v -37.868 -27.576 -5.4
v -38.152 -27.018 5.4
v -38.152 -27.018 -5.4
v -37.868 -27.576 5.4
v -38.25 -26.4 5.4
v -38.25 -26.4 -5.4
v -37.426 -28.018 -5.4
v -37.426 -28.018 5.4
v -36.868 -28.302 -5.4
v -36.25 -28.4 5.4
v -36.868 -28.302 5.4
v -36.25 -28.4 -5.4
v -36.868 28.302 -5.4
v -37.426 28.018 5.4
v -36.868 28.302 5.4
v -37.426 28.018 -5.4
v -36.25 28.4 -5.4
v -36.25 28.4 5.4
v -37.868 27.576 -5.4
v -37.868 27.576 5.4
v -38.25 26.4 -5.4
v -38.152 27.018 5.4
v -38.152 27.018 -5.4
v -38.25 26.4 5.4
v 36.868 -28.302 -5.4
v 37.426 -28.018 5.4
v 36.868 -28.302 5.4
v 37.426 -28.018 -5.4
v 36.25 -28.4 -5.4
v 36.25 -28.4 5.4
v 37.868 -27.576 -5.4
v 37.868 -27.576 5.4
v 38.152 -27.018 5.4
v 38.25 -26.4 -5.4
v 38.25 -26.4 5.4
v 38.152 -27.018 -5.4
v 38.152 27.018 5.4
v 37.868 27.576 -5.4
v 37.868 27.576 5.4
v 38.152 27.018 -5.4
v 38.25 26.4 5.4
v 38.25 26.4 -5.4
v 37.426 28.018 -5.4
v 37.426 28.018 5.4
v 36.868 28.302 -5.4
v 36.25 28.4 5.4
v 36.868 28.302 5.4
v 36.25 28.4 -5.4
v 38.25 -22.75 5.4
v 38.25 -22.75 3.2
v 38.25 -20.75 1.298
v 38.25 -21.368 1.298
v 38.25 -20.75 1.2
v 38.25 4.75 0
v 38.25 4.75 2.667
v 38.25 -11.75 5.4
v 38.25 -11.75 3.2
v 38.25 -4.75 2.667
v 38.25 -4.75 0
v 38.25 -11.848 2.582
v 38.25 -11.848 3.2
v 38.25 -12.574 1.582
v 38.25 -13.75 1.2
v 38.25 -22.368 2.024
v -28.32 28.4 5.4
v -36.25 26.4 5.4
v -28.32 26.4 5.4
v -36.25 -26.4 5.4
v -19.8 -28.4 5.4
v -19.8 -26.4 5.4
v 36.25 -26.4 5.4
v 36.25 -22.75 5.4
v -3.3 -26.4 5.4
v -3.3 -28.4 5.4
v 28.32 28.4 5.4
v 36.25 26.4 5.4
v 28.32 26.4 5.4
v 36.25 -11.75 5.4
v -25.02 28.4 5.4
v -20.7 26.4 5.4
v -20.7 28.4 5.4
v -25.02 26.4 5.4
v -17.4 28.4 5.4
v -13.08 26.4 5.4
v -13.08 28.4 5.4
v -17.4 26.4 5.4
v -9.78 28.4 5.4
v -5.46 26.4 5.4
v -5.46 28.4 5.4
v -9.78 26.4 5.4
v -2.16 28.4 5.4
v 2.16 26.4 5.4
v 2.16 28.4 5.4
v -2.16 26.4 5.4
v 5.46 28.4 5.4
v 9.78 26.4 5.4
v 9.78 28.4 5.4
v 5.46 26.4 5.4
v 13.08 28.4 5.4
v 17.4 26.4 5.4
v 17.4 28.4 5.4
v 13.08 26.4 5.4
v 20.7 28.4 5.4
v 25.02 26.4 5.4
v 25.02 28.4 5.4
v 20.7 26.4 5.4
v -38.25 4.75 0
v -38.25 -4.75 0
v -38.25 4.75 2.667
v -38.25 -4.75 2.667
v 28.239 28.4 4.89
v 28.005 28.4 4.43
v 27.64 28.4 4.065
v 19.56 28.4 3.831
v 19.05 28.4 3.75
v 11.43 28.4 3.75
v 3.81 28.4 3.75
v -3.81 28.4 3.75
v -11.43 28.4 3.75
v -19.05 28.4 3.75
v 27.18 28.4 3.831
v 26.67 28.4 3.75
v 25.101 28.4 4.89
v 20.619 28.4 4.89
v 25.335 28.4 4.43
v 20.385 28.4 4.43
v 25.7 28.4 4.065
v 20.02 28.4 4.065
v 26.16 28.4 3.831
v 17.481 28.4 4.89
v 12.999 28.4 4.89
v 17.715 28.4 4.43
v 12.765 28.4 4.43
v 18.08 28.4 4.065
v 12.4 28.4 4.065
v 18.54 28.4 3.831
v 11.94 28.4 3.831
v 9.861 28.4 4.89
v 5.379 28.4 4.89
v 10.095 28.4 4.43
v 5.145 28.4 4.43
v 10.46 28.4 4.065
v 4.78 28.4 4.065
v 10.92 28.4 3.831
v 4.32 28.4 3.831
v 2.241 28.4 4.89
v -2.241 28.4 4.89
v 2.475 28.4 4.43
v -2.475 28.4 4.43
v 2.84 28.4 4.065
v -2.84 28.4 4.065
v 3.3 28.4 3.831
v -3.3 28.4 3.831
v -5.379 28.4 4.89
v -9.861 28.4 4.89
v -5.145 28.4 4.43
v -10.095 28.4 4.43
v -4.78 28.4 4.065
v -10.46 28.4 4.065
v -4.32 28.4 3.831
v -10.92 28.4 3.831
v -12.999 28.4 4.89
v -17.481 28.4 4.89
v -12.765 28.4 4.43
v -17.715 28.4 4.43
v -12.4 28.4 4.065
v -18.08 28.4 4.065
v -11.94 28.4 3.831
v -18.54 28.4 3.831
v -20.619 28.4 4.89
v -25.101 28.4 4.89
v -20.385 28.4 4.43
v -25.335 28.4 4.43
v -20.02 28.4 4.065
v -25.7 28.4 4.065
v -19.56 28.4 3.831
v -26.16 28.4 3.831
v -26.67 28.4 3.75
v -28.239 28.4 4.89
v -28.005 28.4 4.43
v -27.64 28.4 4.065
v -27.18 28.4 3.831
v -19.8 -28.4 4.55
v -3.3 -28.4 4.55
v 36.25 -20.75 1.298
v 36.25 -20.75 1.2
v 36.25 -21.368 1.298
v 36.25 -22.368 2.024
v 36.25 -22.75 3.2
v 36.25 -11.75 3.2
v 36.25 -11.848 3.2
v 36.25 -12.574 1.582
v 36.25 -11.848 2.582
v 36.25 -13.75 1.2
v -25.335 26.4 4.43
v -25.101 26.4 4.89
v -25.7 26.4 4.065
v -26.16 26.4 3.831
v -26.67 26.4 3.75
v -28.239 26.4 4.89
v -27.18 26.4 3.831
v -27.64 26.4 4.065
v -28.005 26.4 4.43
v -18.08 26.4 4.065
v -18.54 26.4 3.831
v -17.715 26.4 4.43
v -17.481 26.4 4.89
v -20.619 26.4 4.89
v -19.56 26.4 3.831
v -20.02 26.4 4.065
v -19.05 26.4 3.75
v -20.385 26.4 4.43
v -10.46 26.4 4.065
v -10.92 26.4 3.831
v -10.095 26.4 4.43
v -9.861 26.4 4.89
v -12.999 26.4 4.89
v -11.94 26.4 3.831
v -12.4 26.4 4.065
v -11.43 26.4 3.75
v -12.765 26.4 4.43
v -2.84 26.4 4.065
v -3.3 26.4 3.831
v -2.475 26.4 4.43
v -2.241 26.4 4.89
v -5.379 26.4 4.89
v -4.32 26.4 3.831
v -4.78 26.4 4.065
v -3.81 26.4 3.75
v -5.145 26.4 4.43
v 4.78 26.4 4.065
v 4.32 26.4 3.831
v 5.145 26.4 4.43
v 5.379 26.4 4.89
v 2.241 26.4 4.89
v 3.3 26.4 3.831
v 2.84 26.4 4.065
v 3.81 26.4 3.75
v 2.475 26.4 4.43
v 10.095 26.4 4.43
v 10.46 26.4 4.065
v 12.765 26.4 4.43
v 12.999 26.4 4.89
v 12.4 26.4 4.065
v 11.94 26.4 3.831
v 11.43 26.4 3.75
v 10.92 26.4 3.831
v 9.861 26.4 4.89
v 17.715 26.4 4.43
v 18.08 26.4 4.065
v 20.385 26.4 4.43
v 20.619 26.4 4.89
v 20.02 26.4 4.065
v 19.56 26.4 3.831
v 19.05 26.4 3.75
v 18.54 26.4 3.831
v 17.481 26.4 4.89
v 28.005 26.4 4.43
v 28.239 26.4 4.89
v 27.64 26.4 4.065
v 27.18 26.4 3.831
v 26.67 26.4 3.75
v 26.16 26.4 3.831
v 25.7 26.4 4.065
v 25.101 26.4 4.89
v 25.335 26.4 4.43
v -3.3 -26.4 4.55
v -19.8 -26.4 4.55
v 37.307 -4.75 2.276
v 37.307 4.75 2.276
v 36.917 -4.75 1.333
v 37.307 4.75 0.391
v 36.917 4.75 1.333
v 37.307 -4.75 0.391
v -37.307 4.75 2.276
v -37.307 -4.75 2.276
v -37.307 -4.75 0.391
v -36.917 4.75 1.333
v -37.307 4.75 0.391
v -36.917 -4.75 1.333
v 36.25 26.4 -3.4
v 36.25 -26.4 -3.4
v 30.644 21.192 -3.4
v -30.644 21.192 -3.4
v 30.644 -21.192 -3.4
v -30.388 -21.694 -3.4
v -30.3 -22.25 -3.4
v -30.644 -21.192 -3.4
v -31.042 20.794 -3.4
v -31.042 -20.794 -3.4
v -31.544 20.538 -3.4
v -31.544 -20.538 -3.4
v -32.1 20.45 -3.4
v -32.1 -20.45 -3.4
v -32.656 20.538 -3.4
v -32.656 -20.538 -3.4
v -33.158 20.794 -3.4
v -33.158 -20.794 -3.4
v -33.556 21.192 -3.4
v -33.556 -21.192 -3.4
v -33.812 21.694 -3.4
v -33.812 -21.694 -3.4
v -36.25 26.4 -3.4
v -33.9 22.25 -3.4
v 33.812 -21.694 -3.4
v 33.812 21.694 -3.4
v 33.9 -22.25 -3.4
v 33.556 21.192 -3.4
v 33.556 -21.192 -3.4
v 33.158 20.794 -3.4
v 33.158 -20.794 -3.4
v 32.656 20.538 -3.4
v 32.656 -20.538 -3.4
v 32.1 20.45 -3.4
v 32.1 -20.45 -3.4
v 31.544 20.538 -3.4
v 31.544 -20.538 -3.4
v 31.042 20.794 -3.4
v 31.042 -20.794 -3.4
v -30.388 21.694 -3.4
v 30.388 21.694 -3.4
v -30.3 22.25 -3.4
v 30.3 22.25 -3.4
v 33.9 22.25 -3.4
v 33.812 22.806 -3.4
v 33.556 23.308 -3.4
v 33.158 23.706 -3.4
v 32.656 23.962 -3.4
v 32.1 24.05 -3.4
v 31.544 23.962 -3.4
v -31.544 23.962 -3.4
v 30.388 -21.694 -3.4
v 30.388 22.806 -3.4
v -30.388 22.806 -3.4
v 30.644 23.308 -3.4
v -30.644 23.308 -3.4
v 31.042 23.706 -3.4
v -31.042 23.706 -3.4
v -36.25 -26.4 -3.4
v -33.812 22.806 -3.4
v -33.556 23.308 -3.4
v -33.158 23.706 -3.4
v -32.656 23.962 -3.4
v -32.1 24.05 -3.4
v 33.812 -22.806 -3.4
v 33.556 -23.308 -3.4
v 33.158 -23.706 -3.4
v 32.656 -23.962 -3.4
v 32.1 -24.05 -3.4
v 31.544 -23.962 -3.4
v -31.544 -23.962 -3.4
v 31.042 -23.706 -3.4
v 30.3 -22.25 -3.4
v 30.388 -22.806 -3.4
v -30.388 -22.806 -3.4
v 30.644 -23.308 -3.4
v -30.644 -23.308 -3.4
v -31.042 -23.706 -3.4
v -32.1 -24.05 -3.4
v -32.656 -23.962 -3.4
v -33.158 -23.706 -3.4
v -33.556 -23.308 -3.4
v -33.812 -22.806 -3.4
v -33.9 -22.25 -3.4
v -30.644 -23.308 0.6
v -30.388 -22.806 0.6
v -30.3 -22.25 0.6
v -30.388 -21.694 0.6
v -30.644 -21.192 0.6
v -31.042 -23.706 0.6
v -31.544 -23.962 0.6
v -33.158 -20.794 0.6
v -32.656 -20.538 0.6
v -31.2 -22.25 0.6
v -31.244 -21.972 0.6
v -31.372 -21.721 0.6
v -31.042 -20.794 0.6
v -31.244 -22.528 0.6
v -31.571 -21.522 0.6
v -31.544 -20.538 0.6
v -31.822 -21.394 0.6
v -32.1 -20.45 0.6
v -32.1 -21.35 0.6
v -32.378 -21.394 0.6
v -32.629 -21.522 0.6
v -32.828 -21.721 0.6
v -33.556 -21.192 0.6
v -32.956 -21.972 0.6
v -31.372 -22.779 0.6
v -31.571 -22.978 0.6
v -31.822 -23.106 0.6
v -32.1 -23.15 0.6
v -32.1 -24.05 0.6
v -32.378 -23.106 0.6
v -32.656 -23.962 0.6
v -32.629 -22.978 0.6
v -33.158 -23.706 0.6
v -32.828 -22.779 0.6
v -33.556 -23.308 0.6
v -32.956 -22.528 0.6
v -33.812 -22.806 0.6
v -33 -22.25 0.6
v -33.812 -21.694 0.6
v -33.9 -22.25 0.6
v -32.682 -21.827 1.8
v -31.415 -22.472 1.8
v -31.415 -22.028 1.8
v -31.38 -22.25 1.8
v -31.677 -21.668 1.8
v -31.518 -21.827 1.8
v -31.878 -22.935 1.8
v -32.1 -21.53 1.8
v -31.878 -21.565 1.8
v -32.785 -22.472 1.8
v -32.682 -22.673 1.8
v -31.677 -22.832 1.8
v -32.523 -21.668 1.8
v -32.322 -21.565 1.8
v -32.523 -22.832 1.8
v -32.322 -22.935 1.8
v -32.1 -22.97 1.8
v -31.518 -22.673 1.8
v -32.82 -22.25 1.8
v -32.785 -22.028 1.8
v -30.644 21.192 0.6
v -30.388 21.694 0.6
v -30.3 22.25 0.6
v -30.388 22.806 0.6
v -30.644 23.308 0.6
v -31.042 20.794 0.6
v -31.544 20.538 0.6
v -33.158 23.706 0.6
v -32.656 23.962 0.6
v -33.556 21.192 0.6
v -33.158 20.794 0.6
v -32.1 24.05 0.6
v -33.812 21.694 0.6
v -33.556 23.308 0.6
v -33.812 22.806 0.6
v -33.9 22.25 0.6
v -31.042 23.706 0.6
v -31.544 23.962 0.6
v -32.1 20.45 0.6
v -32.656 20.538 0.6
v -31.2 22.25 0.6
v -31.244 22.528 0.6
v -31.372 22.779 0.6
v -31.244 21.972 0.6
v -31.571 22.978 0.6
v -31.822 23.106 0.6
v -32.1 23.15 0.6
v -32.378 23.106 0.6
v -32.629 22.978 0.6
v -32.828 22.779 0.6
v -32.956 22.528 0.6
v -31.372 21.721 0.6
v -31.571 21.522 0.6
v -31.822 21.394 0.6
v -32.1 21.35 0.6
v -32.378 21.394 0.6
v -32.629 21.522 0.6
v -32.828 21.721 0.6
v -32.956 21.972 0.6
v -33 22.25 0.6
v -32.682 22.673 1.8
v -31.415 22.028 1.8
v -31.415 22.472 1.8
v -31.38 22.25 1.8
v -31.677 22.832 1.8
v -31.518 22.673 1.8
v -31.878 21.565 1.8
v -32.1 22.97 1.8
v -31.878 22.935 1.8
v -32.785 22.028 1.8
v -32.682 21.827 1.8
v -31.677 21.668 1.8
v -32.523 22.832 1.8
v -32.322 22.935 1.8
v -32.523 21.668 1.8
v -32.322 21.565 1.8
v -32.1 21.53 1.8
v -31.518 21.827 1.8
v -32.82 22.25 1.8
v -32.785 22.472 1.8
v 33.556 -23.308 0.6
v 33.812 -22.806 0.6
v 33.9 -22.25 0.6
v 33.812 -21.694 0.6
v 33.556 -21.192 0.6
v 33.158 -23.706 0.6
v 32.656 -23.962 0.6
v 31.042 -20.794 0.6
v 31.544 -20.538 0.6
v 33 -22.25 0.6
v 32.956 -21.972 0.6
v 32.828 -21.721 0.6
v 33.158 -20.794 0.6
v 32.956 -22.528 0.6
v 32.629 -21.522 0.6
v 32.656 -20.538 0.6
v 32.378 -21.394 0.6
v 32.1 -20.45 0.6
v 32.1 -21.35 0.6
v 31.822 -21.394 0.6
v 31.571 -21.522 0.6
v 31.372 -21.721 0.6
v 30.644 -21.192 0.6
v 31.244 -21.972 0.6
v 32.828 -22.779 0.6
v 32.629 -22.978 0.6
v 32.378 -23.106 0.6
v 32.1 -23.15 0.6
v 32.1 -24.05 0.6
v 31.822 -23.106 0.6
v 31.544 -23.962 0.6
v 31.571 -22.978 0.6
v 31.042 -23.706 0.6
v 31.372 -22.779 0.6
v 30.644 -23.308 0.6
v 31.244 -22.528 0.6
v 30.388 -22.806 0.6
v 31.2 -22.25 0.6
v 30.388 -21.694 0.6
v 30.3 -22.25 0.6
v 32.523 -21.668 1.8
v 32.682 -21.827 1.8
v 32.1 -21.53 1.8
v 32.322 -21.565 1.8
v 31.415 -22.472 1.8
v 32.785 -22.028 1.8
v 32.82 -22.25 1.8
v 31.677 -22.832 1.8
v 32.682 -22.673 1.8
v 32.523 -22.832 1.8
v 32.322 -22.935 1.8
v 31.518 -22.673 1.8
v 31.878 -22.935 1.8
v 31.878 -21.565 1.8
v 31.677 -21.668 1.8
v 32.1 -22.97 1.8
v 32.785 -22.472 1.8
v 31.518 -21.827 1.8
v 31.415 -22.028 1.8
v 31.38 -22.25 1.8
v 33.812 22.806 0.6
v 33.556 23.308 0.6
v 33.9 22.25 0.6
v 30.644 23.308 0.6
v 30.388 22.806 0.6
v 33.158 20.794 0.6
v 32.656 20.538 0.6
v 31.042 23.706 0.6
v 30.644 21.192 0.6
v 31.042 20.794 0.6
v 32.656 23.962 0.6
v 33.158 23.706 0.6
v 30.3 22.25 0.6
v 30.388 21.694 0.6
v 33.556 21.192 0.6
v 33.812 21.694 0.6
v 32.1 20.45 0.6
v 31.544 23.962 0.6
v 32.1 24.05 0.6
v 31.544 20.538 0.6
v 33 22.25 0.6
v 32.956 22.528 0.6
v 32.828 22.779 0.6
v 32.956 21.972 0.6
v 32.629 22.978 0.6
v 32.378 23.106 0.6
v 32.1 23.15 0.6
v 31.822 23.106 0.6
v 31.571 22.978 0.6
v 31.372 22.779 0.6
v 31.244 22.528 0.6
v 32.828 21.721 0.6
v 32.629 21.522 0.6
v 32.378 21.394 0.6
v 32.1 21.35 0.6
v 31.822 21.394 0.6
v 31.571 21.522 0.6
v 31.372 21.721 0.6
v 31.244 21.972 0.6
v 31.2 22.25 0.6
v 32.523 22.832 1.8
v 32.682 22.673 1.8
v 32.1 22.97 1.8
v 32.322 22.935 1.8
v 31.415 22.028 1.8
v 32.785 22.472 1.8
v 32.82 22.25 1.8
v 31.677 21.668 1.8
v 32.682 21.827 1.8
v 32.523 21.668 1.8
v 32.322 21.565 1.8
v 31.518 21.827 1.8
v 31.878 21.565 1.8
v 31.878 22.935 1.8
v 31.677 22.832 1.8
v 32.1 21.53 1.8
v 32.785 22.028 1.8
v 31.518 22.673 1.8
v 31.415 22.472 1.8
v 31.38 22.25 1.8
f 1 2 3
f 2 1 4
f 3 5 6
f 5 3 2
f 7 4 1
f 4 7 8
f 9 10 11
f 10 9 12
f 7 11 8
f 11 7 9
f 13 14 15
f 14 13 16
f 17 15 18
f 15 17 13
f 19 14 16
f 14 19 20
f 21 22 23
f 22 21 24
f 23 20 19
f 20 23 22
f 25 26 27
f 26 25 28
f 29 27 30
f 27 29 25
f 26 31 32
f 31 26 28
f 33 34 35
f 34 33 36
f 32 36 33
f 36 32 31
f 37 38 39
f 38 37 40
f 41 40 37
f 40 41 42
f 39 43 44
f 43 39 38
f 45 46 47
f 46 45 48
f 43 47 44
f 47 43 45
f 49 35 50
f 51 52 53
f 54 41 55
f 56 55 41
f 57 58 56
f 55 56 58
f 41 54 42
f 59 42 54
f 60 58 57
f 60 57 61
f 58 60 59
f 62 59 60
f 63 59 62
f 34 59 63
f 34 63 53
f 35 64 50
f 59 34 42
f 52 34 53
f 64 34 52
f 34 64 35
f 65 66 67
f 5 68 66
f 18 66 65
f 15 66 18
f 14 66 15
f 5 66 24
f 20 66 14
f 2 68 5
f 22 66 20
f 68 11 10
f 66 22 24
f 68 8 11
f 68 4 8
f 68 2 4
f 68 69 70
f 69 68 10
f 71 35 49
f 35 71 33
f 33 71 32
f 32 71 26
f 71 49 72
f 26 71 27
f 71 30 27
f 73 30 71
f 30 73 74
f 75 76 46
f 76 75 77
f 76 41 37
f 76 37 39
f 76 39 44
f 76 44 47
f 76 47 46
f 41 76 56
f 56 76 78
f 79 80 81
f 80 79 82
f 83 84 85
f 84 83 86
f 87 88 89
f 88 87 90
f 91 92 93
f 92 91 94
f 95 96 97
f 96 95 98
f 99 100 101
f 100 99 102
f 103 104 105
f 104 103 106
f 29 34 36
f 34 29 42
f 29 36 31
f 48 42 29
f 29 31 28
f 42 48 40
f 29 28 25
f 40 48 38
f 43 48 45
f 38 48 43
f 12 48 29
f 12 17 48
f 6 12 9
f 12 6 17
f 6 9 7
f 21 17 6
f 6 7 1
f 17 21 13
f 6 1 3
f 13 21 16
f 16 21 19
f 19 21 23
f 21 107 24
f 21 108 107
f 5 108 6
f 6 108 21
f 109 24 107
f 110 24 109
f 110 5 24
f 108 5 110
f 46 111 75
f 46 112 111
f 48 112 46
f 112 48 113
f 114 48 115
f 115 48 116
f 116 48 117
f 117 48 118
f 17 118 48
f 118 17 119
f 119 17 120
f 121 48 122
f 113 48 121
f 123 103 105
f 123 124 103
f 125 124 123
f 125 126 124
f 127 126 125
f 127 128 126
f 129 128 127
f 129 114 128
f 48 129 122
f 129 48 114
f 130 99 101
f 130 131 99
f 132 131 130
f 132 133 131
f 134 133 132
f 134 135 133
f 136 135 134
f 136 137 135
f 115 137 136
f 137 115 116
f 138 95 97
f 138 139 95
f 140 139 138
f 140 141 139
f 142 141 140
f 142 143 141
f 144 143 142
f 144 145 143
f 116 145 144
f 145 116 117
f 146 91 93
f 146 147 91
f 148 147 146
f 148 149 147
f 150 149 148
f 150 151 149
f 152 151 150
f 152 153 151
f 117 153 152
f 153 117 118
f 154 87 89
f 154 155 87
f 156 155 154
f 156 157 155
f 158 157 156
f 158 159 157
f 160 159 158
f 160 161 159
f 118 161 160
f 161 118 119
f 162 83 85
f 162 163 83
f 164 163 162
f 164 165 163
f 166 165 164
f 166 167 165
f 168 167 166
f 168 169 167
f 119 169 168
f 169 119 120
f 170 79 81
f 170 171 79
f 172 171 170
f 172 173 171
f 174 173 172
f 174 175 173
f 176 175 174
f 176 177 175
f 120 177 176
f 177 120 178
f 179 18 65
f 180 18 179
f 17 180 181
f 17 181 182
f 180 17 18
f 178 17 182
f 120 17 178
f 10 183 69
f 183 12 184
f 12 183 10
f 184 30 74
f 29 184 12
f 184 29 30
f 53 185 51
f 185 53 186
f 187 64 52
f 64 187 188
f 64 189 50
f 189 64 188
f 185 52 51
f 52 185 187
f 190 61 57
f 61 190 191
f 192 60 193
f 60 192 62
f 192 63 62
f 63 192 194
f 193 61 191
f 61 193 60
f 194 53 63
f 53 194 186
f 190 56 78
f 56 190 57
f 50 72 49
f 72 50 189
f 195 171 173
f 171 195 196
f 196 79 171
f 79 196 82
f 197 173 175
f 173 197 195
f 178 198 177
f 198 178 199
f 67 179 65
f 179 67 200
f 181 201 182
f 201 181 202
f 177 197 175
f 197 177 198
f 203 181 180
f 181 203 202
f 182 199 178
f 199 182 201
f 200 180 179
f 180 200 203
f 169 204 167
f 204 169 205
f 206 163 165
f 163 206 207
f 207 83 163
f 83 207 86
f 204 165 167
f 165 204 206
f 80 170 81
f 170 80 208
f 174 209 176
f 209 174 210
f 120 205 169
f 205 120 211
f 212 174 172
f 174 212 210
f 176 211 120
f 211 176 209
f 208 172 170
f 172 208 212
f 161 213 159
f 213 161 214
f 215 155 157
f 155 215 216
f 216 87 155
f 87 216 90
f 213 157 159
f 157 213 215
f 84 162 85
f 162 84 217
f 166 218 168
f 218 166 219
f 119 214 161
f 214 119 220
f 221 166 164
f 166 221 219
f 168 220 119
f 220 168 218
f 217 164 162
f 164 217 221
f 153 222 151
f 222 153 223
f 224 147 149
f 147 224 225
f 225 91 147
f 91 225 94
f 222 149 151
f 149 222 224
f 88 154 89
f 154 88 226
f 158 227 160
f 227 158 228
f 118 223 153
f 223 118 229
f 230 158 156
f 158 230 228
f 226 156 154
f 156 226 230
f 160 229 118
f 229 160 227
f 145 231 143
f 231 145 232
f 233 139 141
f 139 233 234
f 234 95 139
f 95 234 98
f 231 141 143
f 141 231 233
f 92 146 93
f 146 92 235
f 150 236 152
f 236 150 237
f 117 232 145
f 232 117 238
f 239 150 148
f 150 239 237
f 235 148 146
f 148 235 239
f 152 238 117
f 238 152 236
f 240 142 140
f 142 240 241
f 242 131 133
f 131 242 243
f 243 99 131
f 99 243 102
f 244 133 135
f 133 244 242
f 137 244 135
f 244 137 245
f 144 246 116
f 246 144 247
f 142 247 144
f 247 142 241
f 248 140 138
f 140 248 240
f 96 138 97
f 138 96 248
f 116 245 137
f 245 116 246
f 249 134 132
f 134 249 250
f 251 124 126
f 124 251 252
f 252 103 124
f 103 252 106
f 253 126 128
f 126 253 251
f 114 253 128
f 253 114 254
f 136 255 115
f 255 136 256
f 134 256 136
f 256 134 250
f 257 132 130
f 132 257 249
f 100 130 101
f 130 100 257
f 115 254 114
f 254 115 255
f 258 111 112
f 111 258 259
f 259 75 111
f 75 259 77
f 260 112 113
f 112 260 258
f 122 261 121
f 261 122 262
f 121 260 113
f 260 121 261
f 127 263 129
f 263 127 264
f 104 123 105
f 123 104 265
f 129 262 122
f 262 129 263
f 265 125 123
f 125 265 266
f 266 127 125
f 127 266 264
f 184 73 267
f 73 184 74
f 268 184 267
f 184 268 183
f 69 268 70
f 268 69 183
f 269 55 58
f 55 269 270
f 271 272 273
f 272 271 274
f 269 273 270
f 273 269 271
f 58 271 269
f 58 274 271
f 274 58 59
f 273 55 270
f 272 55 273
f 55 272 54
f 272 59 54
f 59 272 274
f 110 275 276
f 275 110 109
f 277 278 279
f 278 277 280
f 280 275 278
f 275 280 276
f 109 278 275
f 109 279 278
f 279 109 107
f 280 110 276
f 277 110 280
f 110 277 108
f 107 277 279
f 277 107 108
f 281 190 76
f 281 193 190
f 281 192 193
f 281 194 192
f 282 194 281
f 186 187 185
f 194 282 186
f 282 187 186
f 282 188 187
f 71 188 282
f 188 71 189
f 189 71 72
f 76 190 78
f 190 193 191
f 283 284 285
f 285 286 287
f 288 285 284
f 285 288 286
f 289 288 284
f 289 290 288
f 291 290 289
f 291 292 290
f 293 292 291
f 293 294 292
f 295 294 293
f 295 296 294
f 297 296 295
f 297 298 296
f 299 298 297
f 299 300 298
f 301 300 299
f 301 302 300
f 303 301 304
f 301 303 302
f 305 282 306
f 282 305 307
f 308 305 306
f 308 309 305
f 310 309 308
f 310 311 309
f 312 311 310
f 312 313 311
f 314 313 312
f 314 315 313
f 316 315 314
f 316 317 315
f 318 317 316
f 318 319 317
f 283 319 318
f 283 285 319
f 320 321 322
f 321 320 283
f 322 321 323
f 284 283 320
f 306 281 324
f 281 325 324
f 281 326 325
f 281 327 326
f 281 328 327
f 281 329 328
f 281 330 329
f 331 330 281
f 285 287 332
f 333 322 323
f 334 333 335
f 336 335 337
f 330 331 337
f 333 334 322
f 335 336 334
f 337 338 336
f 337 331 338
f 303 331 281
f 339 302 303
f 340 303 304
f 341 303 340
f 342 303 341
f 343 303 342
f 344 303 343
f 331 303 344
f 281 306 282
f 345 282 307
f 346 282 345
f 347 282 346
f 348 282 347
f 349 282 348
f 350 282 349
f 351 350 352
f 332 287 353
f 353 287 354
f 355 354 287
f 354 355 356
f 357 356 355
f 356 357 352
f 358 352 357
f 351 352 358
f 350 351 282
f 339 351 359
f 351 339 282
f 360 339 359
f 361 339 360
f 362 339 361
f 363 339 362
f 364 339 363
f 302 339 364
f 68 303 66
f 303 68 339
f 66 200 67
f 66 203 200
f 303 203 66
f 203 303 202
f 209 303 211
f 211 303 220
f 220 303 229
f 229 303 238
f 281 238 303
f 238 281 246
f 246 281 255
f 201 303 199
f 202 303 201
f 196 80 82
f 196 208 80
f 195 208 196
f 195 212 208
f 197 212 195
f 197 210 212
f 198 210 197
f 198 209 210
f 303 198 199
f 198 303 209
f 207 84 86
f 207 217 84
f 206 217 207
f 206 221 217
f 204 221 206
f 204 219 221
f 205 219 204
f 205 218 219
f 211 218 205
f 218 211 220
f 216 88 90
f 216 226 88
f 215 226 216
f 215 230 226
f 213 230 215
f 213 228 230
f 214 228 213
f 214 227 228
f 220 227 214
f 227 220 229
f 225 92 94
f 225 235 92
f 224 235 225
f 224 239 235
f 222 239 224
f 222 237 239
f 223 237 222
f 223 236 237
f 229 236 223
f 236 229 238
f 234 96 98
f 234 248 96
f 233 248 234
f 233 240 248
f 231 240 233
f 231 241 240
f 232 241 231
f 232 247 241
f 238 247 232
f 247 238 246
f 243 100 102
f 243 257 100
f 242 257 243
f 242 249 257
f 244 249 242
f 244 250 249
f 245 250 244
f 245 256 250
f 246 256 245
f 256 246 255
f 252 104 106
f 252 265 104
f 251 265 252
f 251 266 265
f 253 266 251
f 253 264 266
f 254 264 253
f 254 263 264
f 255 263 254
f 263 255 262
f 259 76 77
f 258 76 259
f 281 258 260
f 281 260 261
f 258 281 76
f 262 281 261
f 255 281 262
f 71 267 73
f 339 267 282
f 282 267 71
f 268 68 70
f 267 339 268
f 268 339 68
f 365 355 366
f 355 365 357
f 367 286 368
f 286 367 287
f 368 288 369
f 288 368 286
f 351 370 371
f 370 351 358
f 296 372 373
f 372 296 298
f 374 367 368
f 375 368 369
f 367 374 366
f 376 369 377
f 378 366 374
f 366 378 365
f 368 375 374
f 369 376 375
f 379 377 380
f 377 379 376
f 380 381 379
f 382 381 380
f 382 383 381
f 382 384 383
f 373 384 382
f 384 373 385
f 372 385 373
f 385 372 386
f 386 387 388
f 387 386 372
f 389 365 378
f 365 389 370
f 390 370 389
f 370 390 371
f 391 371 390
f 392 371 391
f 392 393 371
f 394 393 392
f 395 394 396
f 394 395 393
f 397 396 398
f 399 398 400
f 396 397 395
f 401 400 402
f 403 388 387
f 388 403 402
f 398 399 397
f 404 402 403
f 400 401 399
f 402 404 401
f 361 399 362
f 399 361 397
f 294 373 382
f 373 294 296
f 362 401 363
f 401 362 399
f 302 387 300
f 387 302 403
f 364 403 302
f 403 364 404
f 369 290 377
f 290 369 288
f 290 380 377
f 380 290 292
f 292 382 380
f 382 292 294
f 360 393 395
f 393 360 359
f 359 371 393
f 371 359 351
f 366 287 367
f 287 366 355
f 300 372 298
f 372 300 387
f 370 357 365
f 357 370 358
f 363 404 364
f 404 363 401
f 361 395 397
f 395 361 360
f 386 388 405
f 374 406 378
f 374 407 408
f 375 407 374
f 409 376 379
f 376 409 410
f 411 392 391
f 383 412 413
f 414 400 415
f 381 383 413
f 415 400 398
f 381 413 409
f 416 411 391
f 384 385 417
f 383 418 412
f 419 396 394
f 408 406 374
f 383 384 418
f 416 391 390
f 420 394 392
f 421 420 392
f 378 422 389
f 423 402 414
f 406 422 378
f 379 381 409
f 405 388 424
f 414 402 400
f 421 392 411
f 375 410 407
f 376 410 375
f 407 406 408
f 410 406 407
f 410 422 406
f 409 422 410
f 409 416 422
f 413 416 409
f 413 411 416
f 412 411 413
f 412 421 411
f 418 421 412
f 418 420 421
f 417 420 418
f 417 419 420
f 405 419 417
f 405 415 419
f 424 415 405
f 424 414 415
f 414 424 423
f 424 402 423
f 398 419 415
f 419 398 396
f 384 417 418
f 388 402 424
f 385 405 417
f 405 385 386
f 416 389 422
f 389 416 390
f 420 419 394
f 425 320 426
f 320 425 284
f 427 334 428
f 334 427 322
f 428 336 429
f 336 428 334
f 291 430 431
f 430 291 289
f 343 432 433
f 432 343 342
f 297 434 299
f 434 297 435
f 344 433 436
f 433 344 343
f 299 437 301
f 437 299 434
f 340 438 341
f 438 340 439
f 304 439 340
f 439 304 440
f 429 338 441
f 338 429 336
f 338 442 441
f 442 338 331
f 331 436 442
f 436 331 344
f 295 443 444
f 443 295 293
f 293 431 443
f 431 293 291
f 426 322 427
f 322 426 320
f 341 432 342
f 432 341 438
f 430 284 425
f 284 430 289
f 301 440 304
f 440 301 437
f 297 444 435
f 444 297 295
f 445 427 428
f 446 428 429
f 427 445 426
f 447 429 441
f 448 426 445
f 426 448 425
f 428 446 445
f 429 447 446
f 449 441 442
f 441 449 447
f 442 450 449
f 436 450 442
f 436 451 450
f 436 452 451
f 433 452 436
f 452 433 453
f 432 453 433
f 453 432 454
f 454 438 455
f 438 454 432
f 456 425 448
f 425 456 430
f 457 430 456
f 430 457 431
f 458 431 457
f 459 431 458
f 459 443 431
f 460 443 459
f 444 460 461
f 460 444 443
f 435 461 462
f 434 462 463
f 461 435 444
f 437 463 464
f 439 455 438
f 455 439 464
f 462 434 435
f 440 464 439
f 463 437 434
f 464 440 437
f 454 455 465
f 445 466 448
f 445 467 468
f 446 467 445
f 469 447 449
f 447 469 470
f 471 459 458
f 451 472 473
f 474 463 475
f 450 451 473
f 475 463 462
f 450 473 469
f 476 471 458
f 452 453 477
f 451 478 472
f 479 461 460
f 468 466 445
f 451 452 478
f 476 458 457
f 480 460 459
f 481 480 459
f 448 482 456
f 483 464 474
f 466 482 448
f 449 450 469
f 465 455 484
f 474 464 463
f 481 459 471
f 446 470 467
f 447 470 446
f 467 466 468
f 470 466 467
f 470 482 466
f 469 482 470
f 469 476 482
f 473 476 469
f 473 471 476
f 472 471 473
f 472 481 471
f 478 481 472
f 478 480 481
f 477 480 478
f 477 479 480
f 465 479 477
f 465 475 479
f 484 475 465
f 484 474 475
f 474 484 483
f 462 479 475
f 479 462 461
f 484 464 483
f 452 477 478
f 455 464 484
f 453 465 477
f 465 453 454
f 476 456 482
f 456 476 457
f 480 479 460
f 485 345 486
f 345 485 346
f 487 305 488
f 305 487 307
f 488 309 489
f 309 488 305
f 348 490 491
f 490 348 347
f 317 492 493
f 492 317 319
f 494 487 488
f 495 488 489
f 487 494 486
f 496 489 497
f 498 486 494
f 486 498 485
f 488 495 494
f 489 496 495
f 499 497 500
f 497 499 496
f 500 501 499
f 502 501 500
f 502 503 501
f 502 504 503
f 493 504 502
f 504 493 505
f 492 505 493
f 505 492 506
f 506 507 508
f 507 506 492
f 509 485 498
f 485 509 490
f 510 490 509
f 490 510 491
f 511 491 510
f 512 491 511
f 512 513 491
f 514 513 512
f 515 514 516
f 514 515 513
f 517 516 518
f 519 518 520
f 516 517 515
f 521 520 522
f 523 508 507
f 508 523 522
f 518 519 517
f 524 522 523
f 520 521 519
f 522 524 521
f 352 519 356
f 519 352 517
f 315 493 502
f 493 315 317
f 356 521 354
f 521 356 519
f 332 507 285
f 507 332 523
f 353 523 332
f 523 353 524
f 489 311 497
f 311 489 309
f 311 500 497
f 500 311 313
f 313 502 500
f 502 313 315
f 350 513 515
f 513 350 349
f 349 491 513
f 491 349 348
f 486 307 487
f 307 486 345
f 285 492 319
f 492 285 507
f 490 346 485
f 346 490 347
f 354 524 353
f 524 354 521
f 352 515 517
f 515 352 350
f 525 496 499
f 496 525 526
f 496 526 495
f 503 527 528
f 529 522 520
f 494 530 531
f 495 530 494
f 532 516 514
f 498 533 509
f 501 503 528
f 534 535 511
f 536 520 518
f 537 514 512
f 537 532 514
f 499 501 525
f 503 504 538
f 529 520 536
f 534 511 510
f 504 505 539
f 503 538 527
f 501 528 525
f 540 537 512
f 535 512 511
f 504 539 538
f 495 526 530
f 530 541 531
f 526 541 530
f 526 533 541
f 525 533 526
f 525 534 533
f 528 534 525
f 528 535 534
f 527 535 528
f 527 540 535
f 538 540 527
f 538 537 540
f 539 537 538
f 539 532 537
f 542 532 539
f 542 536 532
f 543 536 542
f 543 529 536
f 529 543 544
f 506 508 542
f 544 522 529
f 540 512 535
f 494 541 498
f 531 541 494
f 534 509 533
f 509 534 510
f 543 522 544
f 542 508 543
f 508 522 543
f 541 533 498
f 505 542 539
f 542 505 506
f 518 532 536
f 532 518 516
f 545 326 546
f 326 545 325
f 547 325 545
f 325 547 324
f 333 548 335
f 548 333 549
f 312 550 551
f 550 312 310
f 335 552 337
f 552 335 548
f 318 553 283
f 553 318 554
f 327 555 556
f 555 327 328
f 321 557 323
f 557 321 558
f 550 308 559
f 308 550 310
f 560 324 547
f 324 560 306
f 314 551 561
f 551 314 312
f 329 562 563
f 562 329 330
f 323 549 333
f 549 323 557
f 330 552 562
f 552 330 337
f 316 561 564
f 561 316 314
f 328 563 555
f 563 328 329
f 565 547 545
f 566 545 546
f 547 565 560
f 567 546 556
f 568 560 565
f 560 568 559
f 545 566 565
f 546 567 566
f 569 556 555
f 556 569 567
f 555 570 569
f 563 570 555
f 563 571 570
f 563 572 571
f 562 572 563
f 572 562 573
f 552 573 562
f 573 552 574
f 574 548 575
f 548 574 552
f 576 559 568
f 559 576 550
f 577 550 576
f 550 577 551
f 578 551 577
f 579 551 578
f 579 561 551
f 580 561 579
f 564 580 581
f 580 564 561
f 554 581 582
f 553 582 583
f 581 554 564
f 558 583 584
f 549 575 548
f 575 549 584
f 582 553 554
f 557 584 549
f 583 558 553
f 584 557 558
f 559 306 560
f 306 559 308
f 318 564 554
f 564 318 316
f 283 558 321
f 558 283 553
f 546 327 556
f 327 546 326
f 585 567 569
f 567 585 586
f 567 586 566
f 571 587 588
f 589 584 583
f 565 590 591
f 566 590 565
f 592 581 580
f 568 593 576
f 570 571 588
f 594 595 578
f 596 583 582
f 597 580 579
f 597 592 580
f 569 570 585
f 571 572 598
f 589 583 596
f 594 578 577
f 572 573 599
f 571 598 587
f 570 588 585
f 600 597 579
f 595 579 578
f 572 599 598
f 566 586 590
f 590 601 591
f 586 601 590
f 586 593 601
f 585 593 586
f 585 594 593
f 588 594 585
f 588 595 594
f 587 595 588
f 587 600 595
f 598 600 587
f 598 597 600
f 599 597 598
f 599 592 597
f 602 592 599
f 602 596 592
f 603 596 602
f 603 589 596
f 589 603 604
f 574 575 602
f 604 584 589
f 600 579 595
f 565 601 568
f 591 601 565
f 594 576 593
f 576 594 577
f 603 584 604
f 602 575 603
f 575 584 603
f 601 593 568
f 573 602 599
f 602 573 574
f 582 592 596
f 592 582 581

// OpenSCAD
// file: top.scad
/*
 Copyright (C) 2018 Karim Kanso. All Rights Reserved.

 This program is free software: you can redistribute it and/or modify
 it under the terms of the GNU General Public License as published by
 the Free Software Foundation, either version 3 of the License, or
 (at your option) any later version.

 This program is distributed in the hope that it will be useful,
 but WITHOUT ANY WARRANTY; without even the implied warranty of
 MERCHANTABILITY or FITNESS FOR A PARTICULAR PURPOSE.  See the
 GNU General Public License for more details.

 You should have received a copy of the GNU General Public License
 along with this program.  If not, see <http://www.gnu.org/licenses/>.
*/

include <params.scad>
use <rounding.scad>

module leds() {
    for (i = [0:7]) {
        rotate([270,0,0])
        translate([hob_spacing*i - hob_spacing*3.5,0,0])
          cylinder(r=hob_radius, h=case_thickness+2, $fn=20);
    }
}

module cutouts() {
    // micro usb clearence
    translate([inside_width/2 - 1, -pcb_depth/2 -usb_port_oversize_width + usb_port_inset,pcb_base_z_offset + pcb_height + usb_port_standoff - usb_port_oversize_height + usb_port_height + usb_port_oversize_height*2])
        rotate([0,90,0])
      rounded_cube(2, [usb_port_height + usb_port_oversize_height*2, usb_port_width + usb_port_oversize_width*2, case_thickness + 2], $fn=10);

    // wifi module antanna clearence
    translate([-pcb_width/2 - wifi_module_oversize + wifi_module_inset,-inside_depth/2 - case_thickness - 1,pcb_base_z_offset + pcb_height + wifi_module_standoff - wifi_module_oversize])
        cube([wifi_module_width + wifi_module_oversize*2, case_thickness + 2, wifi_module_height + wifi_module_oversize*2]);

    // led clearence
    translate([0,inside_depth/2-1,pcb_base_z_offset + pcb_height + led_standoff])
        leds();
}

module clip() {
    translate([-case_thickness*1.5,-clip_width/2,0])
    difference() {
        rounded_cube(rounding, [case_thickness*3, clip_width, top_outside_height + clip_overhang], $fn=20);
        translate([-case_thickness*0.5,-0.5,-0.5])
        cube([case_thickness*2, clip_width+1, top_outside_height + clip_overhang + 1]);
    };

    translate([0,0,case_thickness/1.5])
    rotate([90,0,0])
    cylinder(r=case_thickness/1.5,h=clip_width-0.5, center=true, $fn=8);
};

module top() {
    difference() {
        translate([0,0,top_outside_height/2 + bottom_outside_height/2])
            rounded_cube(rounding, [outside_width, outside_depth, top_outside_height], center=true, $fn=20);
        translate([0,0,top_outside_height/2 + bottom_outside_height/2])
        translate([0,0,-case_thickness/2 - 0.5])
            cube([inside_width, inside_depth, top_inside_height + 1], center=true);
        cutouts();
        for (b = buttons) {
            translate([-pcb_width/2 + b[0], -pcb_depth/2 + b[1],pcb_base_z_offset + pcb_height + top_clearence - 0.5])
            cylinder(r=button_hole_radius, h=case_thickness+1, $fn=10);
        };
        for (d = [0:3:9]) {
            translate([pcb_width/2 - 23 - 2, -pcb_depth/2-1 + d + 3, pcb_base_z_offset + pcb_height + top_clearence - 0.5])
            rounded_cube(0.25, [23,1,case_thickness + 1]);
        };
    };

    for (z = [-1,1]) {
        translate([z * (pcb_width/2 + support_hole_radius),
                  z * (pcb_depth/2 + support_hole_radius),
                  0]) {
            translate([0,0,pcb_base_z_offset + pcb_height])
              cylinder(r=support_hole_diameter, h=top_clearence, $fn=20);
       };
    };

    for (b = buttons) {
        translate([-pcb_width/2 + b[0], -pcb_depth/2 + b[1],pcb_base_z_offset + pcb_height + button_top_standoff])
        difference() {
          cylinder(r=button_hole_radius + 1, h=top_clearence - button_top_standoff, $fn=10);
          translate([0, 0, - 0.5])
          cylinder(r=button_hole_radius, h=top_clearence - button_top_standoff + 1, $fn=10);
        };
    };

translate([outside_width/2, 0, 0])
    clip();

translate([-outside_width/2, 0, 0])
    rotate([0,0,180])
    clip();

};

rotate([0,180,0])
  top();
// file: rounding.scad
/*
 Copyright (C) 2018 Karim Kanso. All Rights Reserved.

 This program is free software: you can redistribute it and/or modify
 it under the terms of the GNU General Public License as published by
 the Free Software Foundation, either version 3 of the License, or
 (at your option) any later version.

 This program is distributed in the hope that it will be useful,
 but WITHOUT ANY WARRANTY; without even the implied warranty of
 MERCHANTABILITY or FITNESS FOR A PARTICULAR PURPOSE.  See the
 GNU General Public License for more details.

 You should have received a copy of the GNU General Public License
 along with this program.  If not, see <http://www.gnu.org/licenses/>.
*/

module rounding(r,h) {
    difference() {
        cube([r+1, r+1, h+1]);
        translate([0,0,-1])
        cylinder(r=r, h=h+2);
    };
};

module rounded_cube_aux(r,x) {
    difference() {
        cube(x);
        translate([r,r,-0.5])
        rotate([0,0,180])
            rounding(r,x[2]);
        translate([r,x[1] - r,-0.5])
        rotate([0,0,90])
            rounding(r,x[2]);
        translate([x[0] - r,r,-0.5])
        rotate([0,0,270])
            rounding(r,x[2]);
        translate([x[0] - r, x[1] - r,-0.5])
            rounding(r,x[2]);
    };
};

module rounded_cube(r,x,center=false) {
    if (center) {
        translate([-x[0]/2, -x[1]/2, -x[2]/2])
          rounded_cube_aux(r,x);
    } else {
        rounded_cube_aux(r,x);
    }
};
// file: params.scad
/*
 Copyright (C) 2018 Karim Kanso. All Rights Reserved.

 This program is free software: you can redistribute it and/or modify
 it under the terms of the GNU General Public License as published by
 the Free Software Foundation, either version 3 of the License, or
 (at your option) any later version.

 This program is distributed in the hope that it will be useful,
 but WITHOUT ANY WARRANTY; without even the implied warranty of
 MERCHANTABILITY or FITNESS FOR A PARTICULAR PURPOSE.  See the
 GNU General Public License for more details.

 You should have received a copy of the GNU General Public License
 along with this program.  If not, see <http://www.gnu.org/licenses/>.
*/

pcb_width=62.4;
pcb_depth=42.7;
pcb_height = 1.2;

support_hole_diameter=1.8;
support_hole_radius = support_hole_diameter/2;

usb_port_width = 7.8;
usb_port_height = 2.8;
usb_port_standoff = 1.5;
usb_port_inset = 0.2;
usb_port_oversize_width = 1.6;
usb_port_oversize_height = 2.1;

wifi_module_width = 16;
wifi_module_height = 0.78;
wifi_module_standoff = 3;
wifi_module_inset = 11.65;
wifi_module_oversize = 0.25;

padding=3.25;

case_thickness = 2;
rounding = 2;

inside_width = pcb_width + support_hole_diameter * 2 + padding * 2;
inside_depth = pcb_depth + support_hole_diameter * 2 + padding * 2;

outside_width = inside_width + case_thickness * 2;
outside_depth = inside_depth + case_thickness * 2;

base_clearence = 4;
base_above_clearence = 3.6;

bottom_inside_height = base_clearence + pcb_height + base_above_clearence;
bottom_outside_height = bottom_inside_height + case_thickness;

pcb_base_z_offset = bottom_outside_height/2 - pcb_height - base_above_clearence;

top_clearence = 20;

top_inside_height = top_clearence - base_above_clearence;
top_outside_height = top_inside_height + case_thickness;

hob_radius = 1.65;
hob_spacing = 7.62;

// minimum 3.4
led_standoff = base_above_clearence;
if (led_standoff < 3.4) {
    color("magenta") %text("ERROR!",size=50);
    echo("ERROR: led_standoff less than 3.4");
}


button1_x = 4.4;
button1_y = 8.4;

button2_x = button1_x + 19*2.54;
button2_y = button1_y + 5*2.54;

buttons = [[button1_x, button1_y],
           [button2_x, button2_y]];

button_hole_radius = 1.2;
button_top_standoff = 7;

clip_width = 10;
clip_overhang = bottom_outside_height/2;
// main file
/*
 Copyright (C) 2018 Karim Kanso. All Rights Reserved.

 This program is free software: you can redistribute it and/or modify
 it under the terms of the GNU General Public License as published by
 the Free Software Foundation, either version 3 of the License, or
 (at your option) any later version.

 This program is distributed in the hope that it will be useful,
 but WITHOUT ANY WARRANTY; without even the implied warranty of
 MERCHANTABILITY or FITNESS FOR A PARTICULAR PURPOSE.  See the
 GNU General Public License for more details.

 You should have received a copy of the GNU General Public License
 along with this program.  If not, see <http://www.gnu.org/licenses/>.
*/

include <params.scad>
use <rounding.scad>
use <top.scad>

module bottom() {
    difference() {
        rounded_cube(rounding, [outside_width, outside_depth, bottom_outside_height], center=true, $fn=20);
        translate([0,0,case_thickness/2 + 0.5])
            cube([inside_width, inside_depth, bottom_inside_height + 1], center=true);
        cutouts();
        top();
    };

    for (x = [-1,1]) {
        for (y = [-1,1]) {
            translate([x * (pcb_width/2 + support_hole_radius),
                      y * (pcb_depth/2 + support_hole_radius),
                      0]) {
                translate([0,0,-bottom_outside_height/2 + case_thickness])
                    cylinder(r=support_hole_diameter, h=base_clearence, $fn=20);
                translate([0,0,pcb_base_z_offset])
                    cylinder(r1=support_hole_radius, r2=support_hole_radius*0.8, h=pcb_height, $fn=20);
            };
        };
    };
};

//%top();
bottom();
